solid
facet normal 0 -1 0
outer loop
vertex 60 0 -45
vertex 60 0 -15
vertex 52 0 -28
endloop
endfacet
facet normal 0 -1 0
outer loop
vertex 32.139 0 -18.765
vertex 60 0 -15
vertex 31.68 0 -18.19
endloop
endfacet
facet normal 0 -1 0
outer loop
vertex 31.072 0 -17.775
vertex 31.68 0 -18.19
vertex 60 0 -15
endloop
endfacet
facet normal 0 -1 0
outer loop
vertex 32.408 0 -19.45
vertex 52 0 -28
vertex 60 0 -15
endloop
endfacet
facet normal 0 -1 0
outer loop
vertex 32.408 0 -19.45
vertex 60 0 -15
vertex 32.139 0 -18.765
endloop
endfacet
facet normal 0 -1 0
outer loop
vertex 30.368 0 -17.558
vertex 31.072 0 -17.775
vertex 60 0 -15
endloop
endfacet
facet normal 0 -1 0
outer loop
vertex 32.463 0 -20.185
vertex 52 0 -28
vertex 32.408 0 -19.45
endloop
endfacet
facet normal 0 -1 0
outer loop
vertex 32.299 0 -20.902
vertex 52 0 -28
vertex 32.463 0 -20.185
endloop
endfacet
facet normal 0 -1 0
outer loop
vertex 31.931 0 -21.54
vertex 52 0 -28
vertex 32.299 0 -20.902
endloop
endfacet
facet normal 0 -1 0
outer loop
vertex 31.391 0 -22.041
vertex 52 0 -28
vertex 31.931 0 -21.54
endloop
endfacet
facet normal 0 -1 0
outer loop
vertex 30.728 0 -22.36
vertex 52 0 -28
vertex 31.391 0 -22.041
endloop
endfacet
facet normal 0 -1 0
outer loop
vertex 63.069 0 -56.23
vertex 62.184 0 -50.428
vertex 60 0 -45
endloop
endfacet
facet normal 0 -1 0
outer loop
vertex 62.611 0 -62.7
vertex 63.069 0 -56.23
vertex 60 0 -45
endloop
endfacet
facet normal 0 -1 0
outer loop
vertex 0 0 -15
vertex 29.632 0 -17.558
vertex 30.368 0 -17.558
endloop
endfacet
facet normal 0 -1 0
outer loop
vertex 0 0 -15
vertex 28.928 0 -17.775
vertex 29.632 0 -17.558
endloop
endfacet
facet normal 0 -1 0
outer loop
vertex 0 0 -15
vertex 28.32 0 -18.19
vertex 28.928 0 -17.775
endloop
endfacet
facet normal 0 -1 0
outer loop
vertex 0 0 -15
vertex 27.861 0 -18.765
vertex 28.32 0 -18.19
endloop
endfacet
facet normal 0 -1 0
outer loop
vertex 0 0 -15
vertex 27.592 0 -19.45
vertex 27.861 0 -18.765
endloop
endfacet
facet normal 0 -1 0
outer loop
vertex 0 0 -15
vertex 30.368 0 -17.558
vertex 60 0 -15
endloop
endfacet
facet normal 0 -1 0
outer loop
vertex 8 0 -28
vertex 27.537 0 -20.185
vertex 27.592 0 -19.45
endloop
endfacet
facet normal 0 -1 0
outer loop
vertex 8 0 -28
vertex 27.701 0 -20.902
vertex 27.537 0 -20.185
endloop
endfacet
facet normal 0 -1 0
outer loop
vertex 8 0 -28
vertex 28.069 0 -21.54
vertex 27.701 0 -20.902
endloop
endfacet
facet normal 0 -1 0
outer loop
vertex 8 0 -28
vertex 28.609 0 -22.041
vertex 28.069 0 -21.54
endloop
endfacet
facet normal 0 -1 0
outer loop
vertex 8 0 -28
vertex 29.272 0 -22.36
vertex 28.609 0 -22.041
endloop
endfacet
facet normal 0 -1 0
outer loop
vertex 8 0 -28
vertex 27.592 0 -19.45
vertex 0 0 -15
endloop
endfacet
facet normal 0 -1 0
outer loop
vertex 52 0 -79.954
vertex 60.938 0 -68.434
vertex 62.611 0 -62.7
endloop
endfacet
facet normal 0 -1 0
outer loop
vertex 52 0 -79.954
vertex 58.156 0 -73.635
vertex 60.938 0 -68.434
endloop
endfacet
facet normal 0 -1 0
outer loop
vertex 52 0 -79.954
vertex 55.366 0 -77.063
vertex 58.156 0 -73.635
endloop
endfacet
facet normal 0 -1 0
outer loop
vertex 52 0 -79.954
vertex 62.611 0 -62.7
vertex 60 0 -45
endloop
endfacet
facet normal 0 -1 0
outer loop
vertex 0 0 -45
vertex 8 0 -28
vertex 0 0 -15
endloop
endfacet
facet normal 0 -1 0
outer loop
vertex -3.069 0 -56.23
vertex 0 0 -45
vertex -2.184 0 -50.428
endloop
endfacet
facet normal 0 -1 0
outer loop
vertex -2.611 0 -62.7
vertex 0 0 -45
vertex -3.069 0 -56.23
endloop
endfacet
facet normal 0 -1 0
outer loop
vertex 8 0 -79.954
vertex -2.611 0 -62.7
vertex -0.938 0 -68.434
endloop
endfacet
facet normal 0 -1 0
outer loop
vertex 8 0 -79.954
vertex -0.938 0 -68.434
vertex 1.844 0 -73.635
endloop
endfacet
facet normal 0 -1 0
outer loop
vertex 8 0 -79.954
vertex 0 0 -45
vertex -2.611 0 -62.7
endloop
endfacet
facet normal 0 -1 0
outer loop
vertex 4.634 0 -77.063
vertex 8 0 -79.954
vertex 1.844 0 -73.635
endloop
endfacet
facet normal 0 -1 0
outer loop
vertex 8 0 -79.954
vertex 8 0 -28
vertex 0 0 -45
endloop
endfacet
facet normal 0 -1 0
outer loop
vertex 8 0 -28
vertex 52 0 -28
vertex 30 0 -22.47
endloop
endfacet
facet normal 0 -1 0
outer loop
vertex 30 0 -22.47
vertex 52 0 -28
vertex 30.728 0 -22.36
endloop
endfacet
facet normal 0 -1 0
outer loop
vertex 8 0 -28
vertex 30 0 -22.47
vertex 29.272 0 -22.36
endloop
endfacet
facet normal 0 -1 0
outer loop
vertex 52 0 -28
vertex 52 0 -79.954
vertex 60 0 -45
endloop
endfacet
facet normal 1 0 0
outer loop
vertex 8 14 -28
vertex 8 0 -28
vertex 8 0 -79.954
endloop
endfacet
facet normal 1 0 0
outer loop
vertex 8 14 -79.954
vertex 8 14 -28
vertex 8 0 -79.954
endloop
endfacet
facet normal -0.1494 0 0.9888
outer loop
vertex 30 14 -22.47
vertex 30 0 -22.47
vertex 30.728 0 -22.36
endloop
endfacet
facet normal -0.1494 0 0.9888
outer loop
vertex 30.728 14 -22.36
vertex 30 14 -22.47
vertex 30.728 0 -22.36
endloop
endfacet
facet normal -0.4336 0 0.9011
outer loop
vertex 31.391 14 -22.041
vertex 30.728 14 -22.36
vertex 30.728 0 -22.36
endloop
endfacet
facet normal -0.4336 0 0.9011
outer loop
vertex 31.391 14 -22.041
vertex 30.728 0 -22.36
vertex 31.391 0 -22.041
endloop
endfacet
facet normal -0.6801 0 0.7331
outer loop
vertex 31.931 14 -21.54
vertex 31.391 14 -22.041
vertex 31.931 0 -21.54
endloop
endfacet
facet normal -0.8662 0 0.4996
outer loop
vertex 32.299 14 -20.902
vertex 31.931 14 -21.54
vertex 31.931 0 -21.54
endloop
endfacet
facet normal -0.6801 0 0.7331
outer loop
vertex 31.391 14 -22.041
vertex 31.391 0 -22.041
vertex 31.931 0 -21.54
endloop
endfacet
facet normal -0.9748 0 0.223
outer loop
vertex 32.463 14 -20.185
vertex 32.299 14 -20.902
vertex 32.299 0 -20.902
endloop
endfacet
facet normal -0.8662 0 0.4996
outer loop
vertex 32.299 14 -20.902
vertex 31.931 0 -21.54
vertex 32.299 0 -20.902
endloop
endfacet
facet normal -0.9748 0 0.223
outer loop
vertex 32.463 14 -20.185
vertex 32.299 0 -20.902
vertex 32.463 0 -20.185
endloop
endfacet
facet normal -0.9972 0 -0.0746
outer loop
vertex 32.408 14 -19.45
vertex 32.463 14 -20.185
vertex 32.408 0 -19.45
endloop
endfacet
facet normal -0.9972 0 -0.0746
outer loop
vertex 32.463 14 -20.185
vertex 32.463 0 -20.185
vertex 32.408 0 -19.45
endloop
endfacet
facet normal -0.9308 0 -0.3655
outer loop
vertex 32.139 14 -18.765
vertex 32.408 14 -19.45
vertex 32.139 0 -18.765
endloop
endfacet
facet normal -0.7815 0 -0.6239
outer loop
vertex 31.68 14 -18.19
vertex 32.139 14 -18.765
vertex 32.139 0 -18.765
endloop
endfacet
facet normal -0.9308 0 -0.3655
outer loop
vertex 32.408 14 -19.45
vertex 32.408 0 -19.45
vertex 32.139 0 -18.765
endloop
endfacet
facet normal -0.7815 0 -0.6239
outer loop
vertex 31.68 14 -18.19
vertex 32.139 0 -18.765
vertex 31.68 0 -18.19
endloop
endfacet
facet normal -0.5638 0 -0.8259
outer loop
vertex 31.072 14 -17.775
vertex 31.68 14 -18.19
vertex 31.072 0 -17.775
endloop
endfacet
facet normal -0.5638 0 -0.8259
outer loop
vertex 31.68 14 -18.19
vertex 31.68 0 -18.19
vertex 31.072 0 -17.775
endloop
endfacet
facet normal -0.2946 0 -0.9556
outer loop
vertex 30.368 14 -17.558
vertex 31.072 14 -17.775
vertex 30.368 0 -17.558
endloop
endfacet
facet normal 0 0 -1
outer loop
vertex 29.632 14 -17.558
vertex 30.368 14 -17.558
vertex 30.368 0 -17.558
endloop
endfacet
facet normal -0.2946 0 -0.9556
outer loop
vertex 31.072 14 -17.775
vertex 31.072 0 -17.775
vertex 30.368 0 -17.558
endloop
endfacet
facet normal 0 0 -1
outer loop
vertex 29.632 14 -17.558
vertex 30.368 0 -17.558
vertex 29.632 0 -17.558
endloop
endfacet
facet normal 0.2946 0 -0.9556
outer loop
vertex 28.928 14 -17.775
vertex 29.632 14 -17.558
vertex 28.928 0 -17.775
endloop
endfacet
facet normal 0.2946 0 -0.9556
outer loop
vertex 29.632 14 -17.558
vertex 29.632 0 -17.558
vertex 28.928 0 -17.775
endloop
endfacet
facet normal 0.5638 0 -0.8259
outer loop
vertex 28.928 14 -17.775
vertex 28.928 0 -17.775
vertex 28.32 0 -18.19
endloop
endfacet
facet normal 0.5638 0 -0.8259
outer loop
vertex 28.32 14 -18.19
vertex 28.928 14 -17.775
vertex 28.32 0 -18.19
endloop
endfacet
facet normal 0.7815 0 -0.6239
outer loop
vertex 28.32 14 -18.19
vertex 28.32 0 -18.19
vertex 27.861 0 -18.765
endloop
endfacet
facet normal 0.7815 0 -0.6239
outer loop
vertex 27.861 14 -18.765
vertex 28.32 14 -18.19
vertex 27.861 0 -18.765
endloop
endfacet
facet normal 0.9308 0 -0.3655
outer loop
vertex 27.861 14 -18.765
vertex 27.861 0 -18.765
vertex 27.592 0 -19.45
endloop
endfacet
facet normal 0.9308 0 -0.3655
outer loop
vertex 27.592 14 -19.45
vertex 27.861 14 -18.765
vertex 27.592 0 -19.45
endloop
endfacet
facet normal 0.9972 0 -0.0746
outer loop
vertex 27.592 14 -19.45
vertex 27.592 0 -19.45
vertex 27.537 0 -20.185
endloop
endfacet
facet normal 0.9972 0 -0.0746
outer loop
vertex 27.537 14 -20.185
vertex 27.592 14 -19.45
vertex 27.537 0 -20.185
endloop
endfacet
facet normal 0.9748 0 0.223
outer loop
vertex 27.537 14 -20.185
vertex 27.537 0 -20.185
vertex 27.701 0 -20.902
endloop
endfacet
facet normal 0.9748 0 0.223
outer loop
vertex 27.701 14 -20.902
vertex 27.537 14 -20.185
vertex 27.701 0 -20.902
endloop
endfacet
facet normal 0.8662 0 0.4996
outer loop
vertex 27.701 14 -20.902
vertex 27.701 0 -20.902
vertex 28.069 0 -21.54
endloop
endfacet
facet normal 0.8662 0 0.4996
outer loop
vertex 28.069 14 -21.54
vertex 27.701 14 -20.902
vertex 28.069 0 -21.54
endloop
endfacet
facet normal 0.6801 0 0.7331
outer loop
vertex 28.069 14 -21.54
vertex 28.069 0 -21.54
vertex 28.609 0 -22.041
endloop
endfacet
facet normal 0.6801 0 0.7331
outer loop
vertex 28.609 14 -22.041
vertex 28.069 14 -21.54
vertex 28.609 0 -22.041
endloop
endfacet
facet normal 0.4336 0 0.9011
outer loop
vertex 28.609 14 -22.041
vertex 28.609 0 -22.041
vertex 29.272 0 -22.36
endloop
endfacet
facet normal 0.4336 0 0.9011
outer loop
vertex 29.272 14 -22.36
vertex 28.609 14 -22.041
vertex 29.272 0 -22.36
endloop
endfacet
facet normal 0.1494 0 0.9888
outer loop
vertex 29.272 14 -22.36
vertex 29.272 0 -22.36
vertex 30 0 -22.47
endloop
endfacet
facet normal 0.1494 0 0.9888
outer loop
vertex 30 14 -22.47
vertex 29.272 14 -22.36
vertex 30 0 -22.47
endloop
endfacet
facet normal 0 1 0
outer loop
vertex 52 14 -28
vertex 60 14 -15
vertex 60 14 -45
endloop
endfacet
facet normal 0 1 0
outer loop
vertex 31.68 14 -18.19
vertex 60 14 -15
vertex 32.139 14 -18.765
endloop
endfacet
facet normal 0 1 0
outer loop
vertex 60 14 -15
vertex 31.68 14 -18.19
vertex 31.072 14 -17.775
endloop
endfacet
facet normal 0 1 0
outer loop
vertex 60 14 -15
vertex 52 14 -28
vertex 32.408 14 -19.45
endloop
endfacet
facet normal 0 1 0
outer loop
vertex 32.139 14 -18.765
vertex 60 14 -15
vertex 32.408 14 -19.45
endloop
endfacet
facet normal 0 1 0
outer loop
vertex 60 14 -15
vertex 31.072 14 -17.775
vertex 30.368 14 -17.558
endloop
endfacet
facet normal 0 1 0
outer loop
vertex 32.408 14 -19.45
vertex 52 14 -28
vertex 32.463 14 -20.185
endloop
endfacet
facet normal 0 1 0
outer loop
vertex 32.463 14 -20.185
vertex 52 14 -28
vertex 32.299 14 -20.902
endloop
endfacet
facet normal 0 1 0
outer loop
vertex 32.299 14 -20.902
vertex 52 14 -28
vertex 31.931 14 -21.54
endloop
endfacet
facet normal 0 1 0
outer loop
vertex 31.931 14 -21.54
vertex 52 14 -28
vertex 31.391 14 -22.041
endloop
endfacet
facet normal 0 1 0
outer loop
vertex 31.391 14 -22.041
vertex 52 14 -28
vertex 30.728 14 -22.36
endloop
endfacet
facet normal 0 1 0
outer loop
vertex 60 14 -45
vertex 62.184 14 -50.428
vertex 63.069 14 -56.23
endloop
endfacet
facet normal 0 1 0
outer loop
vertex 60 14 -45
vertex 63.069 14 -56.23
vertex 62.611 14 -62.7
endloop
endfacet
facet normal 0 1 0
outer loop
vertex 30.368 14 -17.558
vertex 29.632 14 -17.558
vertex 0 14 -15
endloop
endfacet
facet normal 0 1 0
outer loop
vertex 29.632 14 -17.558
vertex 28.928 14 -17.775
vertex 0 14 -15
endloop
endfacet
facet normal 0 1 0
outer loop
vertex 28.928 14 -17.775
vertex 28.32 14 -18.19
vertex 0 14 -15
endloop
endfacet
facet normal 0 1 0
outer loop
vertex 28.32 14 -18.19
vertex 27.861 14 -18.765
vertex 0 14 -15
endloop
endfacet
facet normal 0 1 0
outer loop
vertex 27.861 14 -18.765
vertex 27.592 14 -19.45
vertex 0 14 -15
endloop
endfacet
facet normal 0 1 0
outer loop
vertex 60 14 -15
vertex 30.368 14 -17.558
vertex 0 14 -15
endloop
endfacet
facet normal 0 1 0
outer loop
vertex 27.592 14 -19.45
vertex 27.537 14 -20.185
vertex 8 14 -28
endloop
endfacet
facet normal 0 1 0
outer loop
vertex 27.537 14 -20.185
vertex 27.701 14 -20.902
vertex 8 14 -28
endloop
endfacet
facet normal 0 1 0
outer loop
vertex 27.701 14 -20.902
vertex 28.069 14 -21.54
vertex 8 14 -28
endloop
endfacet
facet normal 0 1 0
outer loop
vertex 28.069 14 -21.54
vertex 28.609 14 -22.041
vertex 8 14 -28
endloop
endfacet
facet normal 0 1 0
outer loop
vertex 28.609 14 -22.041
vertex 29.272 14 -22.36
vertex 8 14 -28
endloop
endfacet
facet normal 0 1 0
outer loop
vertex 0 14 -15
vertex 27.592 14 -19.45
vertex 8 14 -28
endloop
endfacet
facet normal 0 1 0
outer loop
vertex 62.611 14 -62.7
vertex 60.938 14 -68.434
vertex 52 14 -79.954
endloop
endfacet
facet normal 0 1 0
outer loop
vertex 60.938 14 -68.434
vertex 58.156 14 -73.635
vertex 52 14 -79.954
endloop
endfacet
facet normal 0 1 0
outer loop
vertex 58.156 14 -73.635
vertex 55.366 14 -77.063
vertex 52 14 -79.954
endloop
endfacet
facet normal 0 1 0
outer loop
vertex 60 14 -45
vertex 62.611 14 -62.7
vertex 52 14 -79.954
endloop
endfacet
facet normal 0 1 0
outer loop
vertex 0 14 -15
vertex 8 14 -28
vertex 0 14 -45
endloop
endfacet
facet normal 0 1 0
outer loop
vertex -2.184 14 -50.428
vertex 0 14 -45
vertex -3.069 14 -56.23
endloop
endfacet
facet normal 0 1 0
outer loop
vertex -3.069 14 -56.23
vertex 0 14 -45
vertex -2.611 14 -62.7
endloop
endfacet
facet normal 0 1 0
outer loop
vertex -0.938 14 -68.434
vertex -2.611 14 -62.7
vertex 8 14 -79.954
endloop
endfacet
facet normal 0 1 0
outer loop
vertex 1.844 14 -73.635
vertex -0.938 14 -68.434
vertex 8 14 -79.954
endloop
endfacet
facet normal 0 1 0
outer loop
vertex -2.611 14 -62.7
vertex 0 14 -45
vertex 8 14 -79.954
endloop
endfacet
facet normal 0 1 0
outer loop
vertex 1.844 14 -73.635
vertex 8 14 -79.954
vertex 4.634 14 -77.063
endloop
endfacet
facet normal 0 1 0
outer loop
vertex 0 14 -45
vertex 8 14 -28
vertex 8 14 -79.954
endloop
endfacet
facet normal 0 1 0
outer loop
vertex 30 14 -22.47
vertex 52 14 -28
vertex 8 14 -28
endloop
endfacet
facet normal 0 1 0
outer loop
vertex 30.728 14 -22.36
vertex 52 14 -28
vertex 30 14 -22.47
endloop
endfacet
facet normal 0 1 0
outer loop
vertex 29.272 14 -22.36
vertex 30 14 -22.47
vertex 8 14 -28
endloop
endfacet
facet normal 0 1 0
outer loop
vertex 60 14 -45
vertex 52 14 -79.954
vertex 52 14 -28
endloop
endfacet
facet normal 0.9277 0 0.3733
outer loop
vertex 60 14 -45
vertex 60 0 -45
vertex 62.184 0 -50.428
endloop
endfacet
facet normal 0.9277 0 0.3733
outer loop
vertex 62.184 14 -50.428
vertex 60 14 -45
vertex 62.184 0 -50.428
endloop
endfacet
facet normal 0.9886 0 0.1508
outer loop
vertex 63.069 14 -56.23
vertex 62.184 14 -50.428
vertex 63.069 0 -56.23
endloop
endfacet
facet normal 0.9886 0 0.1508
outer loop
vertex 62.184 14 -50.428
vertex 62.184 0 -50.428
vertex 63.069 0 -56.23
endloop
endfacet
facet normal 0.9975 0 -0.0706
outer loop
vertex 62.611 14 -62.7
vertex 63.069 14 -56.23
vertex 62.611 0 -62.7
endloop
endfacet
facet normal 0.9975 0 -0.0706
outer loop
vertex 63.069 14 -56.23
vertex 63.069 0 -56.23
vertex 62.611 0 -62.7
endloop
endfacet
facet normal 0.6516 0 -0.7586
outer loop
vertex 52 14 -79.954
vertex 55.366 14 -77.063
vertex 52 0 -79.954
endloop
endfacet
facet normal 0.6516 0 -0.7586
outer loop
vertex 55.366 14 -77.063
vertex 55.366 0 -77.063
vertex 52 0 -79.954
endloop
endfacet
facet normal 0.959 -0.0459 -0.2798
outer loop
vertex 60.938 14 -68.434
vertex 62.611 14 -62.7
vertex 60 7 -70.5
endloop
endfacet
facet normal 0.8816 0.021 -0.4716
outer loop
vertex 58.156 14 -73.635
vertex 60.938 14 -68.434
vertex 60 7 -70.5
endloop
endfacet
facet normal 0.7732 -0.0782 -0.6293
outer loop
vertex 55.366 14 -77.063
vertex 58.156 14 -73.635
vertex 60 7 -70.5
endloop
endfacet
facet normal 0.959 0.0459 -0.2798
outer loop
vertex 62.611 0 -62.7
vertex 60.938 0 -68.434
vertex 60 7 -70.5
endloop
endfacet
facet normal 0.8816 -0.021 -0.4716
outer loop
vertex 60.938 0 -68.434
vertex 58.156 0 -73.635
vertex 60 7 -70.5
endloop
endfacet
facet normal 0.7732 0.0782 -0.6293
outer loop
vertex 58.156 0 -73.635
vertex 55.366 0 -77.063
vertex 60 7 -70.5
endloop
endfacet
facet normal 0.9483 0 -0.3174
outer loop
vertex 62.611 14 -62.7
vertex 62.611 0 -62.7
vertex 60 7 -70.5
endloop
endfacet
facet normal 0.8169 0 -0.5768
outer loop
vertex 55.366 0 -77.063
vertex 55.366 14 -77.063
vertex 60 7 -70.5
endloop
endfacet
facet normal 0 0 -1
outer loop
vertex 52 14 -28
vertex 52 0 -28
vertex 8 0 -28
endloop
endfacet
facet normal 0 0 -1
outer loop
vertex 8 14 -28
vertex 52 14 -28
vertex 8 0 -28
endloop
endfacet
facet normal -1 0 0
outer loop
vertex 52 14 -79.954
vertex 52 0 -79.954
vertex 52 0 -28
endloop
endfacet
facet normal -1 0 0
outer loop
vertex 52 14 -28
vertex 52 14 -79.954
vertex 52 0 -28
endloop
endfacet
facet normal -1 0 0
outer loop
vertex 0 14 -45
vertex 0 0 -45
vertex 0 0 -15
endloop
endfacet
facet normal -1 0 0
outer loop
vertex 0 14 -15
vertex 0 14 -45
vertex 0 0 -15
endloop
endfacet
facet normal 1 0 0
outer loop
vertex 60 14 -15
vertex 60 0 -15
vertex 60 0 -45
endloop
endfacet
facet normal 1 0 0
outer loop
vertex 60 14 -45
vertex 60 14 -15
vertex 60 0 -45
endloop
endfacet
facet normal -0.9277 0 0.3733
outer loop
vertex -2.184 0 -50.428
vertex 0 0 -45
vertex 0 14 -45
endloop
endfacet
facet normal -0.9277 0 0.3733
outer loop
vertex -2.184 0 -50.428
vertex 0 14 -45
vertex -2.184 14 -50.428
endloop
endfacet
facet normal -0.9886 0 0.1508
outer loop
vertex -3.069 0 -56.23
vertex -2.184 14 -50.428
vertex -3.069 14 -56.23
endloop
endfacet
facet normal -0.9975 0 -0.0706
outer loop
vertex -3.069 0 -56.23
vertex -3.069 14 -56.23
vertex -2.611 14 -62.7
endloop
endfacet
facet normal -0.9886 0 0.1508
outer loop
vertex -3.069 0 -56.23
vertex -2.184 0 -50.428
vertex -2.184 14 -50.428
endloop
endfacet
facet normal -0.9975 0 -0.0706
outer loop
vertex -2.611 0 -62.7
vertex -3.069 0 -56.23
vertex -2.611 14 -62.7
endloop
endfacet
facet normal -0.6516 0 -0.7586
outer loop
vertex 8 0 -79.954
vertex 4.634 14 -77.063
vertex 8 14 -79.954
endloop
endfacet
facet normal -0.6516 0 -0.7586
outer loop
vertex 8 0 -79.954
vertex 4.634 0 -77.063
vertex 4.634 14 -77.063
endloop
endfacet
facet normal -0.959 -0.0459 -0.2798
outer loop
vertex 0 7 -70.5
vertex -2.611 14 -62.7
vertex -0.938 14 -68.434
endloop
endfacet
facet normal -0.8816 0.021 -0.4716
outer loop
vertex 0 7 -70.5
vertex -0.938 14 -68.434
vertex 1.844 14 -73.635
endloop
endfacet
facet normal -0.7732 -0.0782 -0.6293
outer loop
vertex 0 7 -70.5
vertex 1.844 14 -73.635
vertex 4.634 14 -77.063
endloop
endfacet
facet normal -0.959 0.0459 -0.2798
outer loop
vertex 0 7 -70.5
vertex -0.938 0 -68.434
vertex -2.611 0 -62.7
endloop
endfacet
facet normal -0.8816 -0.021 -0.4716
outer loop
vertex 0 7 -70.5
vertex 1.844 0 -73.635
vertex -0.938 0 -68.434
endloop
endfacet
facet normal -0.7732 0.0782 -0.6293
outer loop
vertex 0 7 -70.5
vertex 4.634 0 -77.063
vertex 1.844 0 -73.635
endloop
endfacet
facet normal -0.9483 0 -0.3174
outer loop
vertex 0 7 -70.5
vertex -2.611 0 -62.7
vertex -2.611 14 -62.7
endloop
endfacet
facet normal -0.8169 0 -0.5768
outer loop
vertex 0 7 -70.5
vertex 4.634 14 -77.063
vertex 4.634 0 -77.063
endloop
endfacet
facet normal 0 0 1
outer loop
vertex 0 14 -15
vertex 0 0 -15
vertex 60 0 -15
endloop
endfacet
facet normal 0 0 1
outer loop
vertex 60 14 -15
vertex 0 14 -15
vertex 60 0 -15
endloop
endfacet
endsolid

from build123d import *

# Parameters (mm, degrees)
BOSS_EXTRUDE1_DEPTH = 14
SKETCH3_R           = 2.469718116
CUT_EXTRUDE1_DEPTH  = 21


with BuildPart() as part:
    # Sketch1 → Boss-Extrude1 (new body)
    with BuildSketch(Plane(origin=(0, 0, 0), x_dir=(1, 0, 0), z_dir=(0, 1, 0))):
        with BuildLine():
            Line((8, 67.50149873), (8, 79.954057008))
            add(Edge.make_bspline(
                [(0, 45), (-4.267413412, 52.702157849), (-3.849710429, 67.232110416), (4.572220088, 77.524864833), (8, 79.954057008)],
                knots=[0, 0, 0, 0, 0.616858973, 0.90735247, 0.90735247, 0.90735247, 0.90735247], degree=3))
            Line((0, 45), (0, 15))
            Line((0, 15), (60, 15))
            Line((60, 15), (60, 45))
            add(Edge.make_bspline(
                [(60, 45), (64.267413412, 52.702157849), (63.849710429, 67.232110416), (55.427779912, 77.524864833), (52, 79.954057008)],
                knots=[0, 0, 0, 0, 0.616858973, 0.90735247, 0.90735247, 0.90735247, 0.90735247], degree=3))
            Line((52, 79.954057008), (52, 70.29729534))
            Line((52, 70.29729534), (52, 28))
            Line((52, 28), (8, 28))
            Line((8, 28), (8, 67.50149873))
        make_face()
    extrude(amount=BOSS_EXTRUDE1_DEPTH)

    # Sketch3 → Cut-Extrude1 (cut)
    with BuildSketch(Plane.XZ):
        with Locations(Location((30, -20, 0), (0, 0, 270))):
            Circle(SKETCH3_R)
    extrude(amount=-CUT_EXTRUDE1_DEPTH, mode=Mode.SUBTRACT)


solid = part.part
